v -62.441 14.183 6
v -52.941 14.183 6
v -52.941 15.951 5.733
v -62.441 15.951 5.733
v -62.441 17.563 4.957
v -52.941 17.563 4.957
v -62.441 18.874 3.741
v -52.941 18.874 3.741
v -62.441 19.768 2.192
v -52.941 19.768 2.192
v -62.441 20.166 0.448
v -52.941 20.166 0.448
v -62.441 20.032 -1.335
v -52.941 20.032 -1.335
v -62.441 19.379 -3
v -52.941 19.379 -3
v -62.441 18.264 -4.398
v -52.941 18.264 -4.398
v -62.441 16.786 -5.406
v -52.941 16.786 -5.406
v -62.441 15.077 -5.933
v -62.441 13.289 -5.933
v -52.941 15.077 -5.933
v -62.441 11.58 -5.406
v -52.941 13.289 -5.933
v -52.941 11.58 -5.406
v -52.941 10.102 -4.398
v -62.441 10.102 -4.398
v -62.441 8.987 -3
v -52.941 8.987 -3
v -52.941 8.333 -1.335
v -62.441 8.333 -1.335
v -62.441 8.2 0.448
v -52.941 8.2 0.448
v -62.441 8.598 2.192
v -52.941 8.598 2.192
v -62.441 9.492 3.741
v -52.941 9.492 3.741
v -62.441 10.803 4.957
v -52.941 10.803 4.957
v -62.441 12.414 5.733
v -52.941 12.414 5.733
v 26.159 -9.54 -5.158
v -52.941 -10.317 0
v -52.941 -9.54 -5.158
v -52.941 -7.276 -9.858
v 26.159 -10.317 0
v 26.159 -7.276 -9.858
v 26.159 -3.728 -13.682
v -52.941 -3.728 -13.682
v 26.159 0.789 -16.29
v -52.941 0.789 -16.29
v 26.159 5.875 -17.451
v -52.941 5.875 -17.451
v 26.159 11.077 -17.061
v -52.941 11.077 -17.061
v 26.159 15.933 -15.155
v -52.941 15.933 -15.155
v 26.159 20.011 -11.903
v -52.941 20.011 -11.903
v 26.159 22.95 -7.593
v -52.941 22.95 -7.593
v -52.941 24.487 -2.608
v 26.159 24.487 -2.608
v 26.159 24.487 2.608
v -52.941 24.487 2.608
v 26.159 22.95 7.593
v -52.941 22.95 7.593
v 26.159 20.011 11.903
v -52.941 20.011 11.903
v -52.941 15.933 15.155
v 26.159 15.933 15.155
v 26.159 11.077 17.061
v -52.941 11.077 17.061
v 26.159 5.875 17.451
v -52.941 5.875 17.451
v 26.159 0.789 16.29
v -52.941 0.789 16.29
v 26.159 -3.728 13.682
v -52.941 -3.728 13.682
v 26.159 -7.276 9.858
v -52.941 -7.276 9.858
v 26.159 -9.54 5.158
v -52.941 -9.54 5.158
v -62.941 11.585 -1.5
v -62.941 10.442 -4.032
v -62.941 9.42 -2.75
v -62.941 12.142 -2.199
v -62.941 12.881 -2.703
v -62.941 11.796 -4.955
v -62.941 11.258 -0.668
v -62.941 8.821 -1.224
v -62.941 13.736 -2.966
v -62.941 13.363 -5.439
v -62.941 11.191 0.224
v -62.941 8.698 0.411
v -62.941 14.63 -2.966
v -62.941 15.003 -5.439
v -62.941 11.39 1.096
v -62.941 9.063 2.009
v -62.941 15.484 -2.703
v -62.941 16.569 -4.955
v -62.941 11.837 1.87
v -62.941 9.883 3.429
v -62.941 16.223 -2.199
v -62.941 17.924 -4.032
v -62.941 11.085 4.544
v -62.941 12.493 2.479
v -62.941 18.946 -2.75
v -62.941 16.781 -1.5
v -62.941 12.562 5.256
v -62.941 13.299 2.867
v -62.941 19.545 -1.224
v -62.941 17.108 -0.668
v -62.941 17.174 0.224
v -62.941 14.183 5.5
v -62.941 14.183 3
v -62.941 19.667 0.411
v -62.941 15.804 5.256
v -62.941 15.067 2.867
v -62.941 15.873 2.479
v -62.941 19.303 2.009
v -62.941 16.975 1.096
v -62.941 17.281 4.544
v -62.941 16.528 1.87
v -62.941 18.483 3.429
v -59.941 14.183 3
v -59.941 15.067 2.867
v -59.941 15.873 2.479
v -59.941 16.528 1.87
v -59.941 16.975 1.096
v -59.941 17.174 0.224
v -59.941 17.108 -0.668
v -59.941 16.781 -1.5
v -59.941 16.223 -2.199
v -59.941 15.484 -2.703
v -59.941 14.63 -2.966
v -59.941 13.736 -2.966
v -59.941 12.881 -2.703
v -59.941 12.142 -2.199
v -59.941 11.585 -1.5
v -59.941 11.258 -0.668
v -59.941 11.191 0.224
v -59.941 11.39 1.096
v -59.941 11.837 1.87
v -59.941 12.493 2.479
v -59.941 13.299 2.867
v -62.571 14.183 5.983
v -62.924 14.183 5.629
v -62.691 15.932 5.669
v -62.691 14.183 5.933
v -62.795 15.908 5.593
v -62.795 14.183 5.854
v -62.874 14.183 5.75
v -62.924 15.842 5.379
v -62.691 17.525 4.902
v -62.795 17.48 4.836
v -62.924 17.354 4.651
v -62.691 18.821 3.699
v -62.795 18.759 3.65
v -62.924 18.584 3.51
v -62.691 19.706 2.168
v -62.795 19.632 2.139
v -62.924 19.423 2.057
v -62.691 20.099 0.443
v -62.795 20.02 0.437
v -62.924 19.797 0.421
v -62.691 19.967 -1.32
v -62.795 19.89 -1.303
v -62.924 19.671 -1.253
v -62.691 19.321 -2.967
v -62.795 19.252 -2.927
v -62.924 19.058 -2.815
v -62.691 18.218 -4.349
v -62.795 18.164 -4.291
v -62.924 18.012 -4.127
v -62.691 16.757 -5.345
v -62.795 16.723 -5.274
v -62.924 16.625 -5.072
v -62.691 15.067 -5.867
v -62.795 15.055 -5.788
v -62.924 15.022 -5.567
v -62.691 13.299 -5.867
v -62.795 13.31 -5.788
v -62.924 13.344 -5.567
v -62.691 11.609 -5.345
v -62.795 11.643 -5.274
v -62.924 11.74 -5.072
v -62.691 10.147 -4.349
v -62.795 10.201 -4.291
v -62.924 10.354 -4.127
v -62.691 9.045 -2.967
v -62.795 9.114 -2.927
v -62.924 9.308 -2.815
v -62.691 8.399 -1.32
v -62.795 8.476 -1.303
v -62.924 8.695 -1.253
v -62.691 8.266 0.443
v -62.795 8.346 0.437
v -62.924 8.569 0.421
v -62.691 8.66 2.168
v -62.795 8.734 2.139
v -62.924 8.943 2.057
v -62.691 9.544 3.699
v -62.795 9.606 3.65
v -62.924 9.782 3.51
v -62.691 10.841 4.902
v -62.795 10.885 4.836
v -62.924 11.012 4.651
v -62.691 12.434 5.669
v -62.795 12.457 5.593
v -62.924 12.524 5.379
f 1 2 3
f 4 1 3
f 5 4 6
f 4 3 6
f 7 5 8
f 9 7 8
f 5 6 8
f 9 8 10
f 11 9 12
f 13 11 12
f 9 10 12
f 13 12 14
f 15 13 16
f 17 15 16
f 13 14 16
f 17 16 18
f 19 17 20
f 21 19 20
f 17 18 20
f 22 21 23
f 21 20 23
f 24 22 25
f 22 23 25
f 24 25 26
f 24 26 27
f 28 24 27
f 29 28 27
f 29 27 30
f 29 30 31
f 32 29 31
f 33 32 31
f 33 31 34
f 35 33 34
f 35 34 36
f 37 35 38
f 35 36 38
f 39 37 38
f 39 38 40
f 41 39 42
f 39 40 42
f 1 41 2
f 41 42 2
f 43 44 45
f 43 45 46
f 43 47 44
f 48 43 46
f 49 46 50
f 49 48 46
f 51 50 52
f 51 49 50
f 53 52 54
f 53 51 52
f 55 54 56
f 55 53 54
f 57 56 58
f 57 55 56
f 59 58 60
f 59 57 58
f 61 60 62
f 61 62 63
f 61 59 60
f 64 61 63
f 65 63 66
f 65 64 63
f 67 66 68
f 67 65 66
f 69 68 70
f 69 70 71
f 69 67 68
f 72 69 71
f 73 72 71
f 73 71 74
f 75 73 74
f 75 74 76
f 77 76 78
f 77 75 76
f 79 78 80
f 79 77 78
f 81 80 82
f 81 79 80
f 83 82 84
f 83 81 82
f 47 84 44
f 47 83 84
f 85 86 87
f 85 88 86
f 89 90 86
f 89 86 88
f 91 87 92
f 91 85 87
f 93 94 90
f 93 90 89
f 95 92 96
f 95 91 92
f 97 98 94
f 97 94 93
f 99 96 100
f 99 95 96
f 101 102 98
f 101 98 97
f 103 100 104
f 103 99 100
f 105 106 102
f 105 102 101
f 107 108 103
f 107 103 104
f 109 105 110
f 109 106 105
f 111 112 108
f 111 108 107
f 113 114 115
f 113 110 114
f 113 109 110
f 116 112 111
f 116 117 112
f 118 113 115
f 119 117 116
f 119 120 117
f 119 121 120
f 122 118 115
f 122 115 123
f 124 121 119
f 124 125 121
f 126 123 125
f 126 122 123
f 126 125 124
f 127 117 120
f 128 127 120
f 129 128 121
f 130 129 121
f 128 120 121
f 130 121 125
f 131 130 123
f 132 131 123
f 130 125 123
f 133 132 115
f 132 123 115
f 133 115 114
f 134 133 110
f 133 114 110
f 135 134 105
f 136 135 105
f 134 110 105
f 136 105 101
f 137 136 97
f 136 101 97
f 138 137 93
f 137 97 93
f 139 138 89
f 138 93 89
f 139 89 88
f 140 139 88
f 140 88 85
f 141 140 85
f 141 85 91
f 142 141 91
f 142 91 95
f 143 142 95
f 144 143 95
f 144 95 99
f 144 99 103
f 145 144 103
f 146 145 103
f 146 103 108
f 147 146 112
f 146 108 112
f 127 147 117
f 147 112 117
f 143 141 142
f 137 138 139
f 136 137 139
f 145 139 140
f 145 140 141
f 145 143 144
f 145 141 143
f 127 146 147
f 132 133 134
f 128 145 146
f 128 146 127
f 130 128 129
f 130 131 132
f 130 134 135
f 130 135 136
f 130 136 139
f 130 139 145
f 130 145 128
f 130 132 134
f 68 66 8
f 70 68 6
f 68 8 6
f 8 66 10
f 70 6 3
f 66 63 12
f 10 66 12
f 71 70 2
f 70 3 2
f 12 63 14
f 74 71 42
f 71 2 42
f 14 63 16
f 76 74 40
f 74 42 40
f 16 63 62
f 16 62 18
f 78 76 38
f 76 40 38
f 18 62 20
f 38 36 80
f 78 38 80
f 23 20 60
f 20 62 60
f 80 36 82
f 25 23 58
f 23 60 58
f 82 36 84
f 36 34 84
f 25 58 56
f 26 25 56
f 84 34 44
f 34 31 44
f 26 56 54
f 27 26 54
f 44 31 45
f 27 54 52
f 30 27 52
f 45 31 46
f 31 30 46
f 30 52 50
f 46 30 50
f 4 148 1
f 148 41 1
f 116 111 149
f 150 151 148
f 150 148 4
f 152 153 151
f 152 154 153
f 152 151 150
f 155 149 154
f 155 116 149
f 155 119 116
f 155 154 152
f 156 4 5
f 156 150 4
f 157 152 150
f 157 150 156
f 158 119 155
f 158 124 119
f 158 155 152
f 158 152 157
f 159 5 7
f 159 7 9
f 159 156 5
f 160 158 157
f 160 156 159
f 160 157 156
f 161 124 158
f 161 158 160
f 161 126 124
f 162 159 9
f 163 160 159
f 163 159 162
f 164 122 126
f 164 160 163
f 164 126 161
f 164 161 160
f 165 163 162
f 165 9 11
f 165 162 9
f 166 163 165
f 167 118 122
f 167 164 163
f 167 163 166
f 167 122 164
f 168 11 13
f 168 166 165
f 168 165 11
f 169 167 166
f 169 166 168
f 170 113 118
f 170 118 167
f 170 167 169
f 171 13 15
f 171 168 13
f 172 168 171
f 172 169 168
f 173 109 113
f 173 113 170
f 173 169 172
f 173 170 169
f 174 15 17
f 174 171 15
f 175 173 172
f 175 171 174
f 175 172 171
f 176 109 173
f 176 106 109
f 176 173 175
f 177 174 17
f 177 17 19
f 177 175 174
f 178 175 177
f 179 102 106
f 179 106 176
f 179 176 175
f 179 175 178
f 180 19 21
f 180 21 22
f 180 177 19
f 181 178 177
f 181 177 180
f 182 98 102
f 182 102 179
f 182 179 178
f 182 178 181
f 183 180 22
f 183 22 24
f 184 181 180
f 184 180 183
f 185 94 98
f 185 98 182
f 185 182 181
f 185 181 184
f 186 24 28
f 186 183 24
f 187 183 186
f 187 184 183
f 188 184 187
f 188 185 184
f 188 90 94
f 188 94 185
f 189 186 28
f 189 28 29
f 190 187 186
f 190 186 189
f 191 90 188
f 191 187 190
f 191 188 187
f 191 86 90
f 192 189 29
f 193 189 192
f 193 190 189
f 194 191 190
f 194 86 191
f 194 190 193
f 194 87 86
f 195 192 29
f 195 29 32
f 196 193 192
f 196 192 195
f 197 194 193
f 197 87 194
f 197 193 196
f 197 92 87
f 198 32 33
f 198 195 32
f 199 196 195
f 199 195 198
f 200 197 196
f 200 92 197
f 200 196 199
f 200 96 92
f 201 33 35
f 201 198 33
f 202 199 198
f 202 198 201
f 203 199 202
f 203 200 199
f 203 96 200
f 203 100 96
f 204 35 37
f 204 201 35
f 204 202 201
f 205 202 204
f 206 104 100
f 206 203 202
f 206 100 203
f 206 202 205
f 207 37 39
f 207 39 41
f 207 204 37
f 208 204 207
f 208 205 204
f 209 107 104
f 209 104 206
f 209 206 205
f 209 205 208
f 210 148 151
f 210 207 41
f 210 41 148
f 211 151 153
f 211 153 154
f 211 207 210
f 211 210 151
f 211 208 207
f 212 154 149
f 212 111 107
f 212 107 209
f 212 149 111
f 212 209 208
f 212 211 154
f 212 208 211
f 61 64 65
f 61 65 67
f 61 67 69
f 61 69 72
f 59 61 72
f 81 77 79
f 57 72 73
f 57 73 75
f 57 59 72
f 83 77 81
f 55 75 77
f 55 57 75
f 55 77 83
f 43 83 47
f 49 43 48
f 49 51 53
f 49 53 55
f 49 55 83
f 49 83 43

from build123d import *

# Parameters (mm, degrees)
SKETCH1_W           = 79.1
SKETCH1_H           = 17.5
SKETCH2_R           = 6
BOSS_EXTRUDE1_DEPTH = 10
FILLET2_R           = 0.5
SKETCH3_R           = 3
CUT_EXTRUDE3_DEPTH  = 3


with BuildPart() as part:
    # Sketch1 → Revolve1 (revolve)
    with BuildSketch(Plane.XY):
        with Locations((-13.391352503, -1.567164179)):
            Rectangle(SKETCH1_W, SKETCH1_H)
    revolve(axis=Axis((-52.941352503, 7.182835821, 0), (1, 0, 0)))

    # Sketch2 → Boss-Extrude1 (add)
    with BuildSketch(Plane.ZY.offset(52.941352503)):
        with Locations((0, 14.182835821)):
            Circle(SKETCH2_R)
    extrude(amount=BOSS_EXTRUDE1_DEPTH)

    # Fillet2
    fillet2_edges = [part.edges().sort_by_distance(p)[0] for p in [
        (-62.941352503, 14.182835821, -6),
    ]]
    fillet(fillet2_edges, radius=FILLET2_R)

    # Sketch3 → Cut-Extrude3 (cut)
    with BuildSketch(Plane.ZY.offset(62.941352503)):
        with Locations((0, 14.182835821)):
            Circle(SKETCH3_R)
    extrude(amount=-CUT_EXTRUDE3_DEPTH, mode=Mode.SUBTRACT)


solid = part.part
